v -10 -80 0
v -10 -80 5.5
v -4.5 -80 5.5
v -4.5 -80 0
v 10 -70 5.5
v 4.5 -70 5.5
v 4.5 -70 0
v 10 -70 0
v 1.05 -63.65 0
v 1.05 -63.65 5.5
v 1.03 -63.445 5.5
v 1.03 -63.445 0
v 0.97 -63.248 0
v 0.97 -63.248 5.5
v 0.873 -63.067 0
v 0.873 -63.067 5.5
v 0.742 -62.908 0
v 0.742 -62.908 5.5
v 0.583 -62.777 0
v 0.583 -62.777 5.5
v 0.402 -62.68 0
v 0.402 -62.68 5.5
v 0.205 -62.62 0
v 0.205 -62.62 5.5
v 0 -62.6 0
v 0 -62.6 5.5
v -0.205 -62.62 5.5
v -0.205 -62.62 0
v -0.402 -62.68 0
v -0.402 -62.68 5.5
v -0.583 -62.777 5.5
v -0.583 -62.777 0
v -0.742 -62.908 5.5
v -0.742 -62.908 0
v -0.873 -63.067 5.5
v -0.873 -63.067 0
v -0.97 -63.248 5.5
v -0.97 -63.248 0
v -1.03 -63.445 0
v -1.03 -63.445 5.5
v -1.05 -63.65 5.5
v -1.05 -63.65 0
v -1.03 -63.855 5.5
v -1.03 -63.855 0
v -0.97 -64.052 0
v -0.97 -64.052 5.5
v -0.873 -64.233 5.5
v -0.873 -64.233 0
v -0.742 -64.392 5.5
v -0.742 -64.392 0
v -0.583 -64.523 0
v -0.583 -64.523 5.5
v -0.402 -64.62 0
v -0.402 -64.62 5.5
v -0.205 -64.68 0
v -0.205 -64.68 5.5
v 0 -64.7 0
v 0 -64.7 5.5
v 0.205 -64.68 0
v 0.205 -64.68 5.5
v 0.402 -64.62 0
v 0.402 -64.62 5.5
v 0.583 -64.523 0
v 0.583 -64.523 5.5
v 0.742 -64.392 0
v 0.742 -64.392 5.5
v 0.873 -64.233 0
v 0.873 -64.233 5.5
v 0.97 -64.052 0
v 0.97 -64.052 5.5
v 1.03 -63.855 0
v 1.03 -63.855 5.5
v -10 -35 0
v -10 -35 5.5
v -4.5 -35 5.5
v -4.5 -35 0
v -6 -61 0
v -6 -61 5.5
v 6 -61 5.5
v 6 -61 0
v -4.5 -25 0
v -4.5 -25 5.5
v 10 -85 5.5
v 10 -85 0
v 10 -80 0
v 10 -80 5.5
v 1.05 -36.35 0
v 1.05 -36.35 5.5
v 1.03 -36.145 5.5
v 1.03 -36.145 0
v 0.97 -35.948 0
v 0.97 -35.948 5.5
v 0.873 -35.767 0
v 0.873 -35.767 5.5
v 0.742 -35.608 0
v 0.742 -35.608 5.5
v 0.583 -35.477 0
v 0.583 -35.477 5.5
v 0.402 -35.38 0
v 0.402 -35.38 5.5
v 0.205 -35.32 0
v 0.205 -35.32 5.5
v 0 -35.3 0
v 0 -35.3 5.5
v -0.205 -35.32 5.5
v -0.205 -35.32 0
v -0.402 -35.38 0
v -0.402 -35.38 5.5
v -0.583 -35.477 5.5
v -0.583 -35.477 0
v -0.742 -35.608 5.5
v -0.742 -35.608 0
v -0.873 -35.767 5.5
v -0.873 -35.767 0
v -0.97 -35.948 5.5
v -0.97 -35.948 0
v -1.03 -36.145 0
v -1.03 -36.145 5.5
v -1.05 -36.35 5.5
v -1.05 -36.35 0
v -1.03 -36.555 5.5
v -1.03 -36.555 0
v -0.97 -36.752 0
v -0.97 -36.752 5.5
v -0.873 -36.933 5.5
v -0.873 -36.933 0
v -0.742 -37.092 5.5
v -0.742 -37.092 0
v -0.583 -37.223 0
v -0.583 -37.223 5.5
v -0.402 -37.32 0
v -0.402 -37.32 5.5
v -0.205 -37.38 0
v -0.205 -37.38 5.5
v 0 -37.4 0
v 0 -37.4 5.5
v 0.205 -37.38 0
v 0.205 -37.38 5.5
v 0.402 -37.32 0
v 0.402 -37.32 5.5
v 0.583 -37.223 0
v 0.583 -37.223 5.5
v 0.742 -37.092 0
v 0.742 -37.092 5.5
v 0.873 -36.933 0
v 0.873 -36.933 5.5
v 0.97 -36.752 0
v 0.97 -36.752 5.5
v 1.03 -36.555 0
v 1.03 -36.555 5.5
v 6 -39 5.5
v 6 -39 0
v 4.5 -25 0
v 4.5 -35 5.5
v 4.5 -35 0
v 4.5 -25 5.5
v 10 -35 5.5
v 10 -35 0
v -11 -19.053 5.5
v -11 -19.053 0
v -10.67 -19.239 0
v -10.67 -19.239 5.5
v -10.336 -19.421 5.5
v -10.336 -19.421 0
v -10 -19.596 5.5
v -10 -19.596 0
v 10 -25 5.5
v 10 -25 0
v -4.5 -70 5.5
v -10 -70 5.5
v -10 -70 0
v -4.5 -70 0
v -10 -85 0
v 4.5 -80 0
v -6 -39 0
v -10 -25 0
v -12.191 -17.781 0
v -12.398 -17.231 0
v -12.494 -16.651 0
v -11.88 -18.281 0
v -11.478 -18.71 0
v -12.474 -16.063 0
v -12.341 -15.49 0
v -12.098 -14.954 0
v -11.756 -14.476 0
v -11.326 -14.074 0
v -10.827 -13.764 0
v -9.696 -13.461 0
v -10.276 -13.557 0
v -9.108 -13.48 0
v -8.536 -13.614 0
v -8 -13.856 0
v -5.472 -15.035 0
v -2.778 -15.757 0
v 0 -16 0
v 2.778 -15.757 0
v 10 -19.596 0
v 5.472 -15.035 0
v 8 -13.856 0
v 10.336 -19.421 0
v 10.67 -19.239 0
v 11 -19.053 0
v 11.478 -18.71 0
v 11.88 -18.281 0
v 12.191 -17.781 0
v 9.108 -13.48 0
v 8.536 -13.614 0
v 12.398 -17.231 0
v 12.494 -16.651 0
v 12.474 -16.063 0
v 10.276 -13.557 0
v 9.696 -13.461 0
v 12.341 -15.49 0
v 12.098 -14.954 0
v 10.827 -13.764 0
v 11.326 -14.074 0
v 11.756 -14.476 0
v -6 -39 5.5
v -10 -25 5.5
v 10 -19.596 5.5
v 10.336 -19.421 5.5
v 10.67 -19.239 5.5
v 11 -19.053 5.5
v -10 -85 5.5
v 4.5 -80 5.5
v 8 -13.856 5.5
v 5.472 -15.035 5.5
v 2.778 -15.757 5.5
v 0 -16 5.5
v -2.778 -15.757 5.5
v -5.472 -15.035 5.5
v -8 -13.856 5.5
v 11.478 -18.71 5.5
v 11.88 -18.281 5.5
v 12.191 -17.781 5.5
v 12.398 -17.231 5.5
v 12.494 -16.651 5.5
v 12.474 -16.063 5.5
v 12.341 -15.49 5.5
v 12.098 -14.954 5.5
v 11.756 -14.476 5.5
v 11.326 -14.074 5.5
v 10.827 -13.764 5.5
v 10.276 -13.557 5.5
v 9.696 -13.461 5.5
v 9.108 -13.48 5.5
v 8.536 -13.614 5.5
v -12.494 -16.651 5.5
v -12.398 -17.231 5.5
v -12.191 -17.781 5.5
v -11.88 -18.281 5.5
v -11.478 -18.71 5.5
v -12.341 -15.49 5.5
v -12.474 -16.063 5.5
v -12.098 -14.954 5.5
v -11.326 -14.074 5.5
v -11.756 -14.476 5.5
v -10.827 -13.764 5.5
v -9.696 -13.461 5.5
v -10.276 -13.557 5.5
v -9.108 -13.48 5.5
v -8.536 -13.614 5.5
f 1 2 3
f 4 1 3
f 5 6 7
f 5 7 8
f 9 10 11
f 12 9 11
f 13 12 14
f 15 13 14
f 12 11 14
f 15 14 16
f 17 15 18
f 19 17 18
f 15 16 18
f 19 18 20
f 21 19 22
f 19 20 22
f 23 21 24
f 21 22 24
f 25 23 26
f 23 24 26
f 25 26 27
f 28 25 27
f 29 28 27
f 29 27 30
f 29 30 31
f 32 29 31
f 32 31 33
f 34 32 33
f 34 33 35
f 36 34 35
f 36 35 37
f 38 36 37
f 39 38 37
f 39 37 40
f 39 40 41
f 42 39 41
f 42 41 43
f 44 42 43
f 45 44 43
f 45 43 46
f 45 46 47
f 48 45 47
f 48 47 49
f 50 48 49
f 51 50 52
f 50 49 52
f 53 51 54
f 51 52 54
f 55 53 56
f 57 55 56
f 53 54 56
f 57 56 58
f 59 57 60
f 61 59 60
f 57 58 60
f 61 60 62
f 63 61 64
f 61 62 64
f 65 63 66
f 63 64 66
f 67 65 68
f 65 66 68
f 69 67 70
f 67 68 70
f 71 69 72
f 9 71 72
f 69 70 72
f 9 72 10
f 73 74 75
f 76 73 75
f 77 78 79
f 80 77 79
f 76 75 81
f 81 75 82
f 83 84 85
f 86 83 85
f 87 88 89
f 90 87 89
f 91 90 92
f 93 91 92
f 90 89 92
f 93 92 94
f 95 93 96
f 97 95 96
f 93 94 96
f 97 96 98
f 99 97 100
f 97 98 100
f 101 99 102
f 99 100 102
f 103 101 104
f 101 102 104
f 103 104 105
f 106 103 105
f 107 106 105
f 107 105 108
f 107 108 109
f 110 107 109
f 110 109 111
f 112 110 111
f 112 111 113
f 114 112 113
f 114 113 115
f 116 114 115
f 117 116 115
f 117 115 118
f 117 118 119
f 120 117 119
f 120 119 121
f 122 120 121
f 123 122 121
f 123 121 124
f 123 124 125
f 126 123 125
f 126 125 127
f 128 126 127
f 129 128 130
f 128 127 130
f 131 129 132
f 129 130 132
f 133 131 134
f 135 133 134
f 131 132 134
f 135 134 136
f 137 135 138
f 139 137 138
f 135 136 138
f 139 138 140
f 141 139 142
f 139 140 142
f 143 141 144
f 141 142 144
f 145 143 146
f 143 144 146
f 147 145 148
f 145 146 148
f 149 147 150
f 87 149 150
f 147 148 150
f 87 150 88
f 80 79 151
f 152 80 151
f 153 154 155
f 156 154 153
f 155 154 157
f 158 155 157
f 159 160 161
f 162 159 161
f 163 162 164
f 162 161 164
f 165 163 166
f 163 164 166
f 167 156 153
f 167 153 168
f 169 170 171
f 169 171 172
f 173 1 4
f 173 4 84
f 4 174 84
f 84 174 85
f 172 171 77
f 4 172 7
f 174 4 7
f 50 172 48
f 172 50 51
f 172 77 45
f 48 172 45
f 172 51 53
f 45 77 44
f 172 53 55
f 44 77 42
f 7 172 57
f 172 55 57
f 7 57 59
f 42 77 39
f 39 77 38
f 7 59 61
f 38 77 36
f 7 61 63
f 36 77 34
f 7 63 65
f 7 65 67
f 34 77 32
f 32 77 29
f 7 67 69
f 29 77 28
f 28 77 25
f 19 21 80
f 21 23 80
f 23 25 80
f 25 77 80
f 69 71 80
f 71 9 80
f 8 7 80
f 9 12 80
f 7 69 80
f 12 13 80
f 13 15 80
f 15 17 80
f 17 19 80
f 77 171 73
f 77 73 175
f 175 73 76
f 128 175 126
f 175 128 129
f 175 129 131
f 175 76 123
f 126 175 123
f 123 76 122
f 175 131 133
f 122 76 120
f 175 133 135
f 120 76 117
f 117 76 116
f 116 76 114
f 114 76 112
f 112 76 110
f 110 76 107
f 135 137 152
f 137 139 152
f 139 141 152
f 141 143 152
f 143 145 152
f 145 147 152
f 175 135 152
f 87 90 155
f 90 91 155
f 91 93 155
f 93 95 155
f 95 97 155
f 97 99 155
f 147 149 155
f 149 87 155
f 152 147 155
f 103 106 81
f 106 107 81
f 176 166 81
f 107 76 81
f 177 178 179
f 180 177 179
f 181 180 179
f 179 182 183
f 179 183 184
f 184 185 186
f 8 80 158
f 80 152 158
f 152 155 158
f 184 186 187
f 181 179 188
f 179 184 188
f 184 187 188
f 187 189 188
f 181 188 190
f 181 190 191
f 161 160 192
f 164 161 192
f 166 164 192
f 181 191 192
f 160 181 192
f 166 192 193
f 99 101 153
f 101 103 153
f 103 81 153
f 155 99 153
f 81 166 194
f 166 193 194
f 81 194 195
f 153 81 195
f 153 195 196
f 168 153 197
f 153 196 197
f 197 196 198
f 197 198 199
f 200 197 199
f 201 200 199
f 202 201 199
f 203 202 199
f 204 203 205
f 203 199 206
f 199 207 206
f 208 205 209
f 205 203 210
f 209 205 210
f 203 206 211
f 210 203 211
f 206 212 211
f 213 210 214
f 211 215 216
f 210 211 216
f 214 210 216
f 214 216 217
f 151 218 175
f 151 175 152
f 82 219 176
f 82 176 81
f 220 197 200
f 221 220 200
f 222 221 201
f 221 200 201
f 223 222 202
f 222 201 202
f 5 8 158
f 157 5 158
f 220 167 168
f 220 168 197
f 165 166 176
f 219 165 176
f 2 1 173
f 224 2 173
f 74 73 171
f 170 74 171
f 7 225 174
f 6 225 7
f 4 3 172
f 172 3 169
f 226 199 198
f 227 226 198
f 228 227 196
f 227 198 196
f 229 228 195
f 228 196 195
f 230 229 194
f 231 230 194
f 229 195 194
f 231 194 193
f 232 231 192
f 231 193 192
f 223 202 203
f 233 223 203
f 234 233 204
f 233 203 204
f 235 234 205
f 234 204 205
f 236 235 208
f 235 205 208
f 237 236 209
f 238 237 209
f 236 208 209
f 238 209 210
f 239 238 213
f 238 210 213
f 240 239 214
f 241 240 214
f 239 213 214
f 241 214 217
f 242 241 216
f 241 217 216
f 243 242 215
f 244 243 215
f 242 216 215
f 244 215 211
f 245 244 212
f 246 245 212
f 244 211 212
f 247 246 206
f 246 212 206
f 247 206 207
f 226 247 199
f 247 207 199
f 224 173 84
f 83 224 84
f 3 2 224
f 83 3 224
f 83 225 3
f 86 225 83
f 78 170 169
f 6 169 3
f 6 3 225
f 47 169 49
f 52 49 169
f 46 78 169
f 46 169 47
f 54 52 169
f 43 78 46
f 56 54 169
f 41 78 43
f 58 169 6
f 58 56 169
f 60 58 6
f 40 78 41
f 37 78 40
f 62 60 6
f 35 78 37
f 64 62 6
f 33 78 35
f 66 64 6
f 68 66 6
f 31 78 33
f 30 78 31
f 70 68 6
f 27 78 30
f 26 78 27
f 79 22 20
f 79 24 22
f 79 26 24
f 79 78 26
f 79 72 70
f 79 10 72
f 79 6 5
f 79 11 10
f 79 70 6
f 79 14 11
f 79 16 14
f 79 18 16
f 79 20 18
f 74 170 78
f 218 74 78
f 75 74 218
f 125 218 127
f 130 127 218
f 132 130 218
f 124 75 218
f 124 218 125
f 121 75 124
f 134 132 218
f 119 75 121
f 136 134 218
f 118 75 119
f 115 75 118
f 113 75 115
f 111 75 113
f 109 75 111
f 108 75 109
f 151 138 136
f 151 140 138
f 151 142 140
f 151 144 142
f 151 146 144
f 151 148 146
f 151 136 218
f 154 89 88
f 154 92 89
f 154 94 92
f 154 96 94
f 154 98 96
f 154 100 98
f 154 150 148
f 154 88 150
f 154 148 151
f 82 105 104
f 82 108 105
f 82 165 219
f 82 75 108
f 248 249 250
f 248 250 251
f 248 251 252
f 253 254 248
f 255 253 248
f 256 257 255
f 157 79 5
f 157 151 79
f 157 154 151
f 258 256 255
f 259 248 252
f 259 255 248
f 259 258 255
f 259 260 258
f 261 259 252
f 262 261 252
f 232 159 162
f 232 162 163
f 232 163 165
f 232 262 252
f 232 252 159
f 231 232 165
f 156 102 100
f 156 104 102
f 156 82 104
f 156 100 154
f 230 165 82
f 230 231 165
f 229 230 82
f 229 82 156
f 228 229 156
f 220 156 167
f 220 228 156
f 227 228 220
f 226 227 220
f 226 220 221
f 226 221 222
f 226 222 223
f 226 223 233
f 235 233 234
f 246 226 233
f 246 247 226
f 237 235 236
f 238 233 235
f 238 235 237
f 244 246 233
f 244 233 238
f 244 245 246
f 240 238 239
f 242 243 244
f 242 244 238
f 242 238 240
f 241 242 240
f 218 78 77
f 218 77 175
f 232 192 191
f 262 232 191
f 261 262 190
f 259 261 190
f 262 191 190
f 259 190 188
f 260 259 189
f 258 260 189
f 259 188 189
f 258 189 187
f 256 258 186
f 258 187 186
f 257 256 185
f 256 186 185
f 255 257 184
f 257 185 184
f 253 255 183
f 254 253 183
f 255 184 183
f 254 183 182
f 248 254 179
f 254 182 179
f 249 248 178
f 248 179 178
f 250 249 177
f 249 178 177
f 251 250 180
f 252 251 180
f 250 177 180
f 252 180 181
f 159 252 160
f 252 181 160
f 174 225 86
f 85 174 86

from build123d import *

# Parameters (mm, degrees)
EXTRUDE_1_DEPTH     = 5.5
SKETCH_3_R          = 1.05
SKETCH_3_W          = 12
SKETCH_3_H          = 22
CUT_EXTRUDE_2_DEPTH = 87.090069114
SKETCH_2_W          = 5.5
SKETCH_2_H          = 10
CUT_EXTRUDE_3_DEPTH = 87.090069114


with BuildPart() as part:
    # ｽｹｯﾁ1 → ﾎﾞｽ - 押し出し1 (new body)
    with BuildSketch(Plane.XY):
        with BuildLine():
            Line((-10, -19.595917942), (-10, -85))
            Line((-10, -85), (10, -85))
            Line((10, -85), (10, -19.595917942))
            ThreePointArc((10, -19.595917942), (10.503514163, -19.330705891), (11, -19.052558883))
            ThreePointArc((11, -19.052558883), (12.098076211, -14.954482672), (8, -13.856406461))
            ThreePointArc((8, -13.856406461), (0, -16), (-8, -13.856406461))
            ThreePointArc((-8, -13.856406461), (-12.098076211, -14.954482672), (-11, -19.052558883))
            ThreePointArc((-11, -19.052558883), (-10.503514163, -19.330705891), (-10, -19.595917942))
        make_face()
    extrude(amount=EXTRUDE_1_DEPTH)

    # ｽｹｯﾁ3 → ｶｯﾄ - 押し出し2 (cut, through all)
    with BuildSketch(Plane.XY.offset(5.5)):
        with Locations((0, -36.35)):
            Circle(SKETCH_3_R)
        with Locations((0, -63.65)):
            Circle(SKETCH_3_R)
        with Locations((0, -50)):
            Rectangle(SKETCH_3_W, SKETCH_3_H)
    extrude(amount=-CUT_EXTRUDE_2_DEPTH, mode=Mode.SUBTRACT)

    # ｽｹｯﾁ2 → ｶｯﾄ - 押し出し3 (cut, through all)
    with BuildSketch(Plane.XY.offset(5.5)):
        with Locations((-7.25, -75)):
            Rectangle(SKETCH_2_W, SKETCH_2_H)
        with Locations((-7.25, -30)):
            Rectangle(SKETCH_2_W, SKETCH_2_H)
        with Locations((7.25, -75)):
            Rectangle(SKETCH_2_W, SKETCH_2_H)
        with Locations((7.25, -30)):
            Rectangle(SKETCH_2_W, SKETCH_2_H)
    extrude(amount=-CUT_EXTRUDE_3_DEPTH, mode=Mode.SUBTRACT)


solid = part.part
